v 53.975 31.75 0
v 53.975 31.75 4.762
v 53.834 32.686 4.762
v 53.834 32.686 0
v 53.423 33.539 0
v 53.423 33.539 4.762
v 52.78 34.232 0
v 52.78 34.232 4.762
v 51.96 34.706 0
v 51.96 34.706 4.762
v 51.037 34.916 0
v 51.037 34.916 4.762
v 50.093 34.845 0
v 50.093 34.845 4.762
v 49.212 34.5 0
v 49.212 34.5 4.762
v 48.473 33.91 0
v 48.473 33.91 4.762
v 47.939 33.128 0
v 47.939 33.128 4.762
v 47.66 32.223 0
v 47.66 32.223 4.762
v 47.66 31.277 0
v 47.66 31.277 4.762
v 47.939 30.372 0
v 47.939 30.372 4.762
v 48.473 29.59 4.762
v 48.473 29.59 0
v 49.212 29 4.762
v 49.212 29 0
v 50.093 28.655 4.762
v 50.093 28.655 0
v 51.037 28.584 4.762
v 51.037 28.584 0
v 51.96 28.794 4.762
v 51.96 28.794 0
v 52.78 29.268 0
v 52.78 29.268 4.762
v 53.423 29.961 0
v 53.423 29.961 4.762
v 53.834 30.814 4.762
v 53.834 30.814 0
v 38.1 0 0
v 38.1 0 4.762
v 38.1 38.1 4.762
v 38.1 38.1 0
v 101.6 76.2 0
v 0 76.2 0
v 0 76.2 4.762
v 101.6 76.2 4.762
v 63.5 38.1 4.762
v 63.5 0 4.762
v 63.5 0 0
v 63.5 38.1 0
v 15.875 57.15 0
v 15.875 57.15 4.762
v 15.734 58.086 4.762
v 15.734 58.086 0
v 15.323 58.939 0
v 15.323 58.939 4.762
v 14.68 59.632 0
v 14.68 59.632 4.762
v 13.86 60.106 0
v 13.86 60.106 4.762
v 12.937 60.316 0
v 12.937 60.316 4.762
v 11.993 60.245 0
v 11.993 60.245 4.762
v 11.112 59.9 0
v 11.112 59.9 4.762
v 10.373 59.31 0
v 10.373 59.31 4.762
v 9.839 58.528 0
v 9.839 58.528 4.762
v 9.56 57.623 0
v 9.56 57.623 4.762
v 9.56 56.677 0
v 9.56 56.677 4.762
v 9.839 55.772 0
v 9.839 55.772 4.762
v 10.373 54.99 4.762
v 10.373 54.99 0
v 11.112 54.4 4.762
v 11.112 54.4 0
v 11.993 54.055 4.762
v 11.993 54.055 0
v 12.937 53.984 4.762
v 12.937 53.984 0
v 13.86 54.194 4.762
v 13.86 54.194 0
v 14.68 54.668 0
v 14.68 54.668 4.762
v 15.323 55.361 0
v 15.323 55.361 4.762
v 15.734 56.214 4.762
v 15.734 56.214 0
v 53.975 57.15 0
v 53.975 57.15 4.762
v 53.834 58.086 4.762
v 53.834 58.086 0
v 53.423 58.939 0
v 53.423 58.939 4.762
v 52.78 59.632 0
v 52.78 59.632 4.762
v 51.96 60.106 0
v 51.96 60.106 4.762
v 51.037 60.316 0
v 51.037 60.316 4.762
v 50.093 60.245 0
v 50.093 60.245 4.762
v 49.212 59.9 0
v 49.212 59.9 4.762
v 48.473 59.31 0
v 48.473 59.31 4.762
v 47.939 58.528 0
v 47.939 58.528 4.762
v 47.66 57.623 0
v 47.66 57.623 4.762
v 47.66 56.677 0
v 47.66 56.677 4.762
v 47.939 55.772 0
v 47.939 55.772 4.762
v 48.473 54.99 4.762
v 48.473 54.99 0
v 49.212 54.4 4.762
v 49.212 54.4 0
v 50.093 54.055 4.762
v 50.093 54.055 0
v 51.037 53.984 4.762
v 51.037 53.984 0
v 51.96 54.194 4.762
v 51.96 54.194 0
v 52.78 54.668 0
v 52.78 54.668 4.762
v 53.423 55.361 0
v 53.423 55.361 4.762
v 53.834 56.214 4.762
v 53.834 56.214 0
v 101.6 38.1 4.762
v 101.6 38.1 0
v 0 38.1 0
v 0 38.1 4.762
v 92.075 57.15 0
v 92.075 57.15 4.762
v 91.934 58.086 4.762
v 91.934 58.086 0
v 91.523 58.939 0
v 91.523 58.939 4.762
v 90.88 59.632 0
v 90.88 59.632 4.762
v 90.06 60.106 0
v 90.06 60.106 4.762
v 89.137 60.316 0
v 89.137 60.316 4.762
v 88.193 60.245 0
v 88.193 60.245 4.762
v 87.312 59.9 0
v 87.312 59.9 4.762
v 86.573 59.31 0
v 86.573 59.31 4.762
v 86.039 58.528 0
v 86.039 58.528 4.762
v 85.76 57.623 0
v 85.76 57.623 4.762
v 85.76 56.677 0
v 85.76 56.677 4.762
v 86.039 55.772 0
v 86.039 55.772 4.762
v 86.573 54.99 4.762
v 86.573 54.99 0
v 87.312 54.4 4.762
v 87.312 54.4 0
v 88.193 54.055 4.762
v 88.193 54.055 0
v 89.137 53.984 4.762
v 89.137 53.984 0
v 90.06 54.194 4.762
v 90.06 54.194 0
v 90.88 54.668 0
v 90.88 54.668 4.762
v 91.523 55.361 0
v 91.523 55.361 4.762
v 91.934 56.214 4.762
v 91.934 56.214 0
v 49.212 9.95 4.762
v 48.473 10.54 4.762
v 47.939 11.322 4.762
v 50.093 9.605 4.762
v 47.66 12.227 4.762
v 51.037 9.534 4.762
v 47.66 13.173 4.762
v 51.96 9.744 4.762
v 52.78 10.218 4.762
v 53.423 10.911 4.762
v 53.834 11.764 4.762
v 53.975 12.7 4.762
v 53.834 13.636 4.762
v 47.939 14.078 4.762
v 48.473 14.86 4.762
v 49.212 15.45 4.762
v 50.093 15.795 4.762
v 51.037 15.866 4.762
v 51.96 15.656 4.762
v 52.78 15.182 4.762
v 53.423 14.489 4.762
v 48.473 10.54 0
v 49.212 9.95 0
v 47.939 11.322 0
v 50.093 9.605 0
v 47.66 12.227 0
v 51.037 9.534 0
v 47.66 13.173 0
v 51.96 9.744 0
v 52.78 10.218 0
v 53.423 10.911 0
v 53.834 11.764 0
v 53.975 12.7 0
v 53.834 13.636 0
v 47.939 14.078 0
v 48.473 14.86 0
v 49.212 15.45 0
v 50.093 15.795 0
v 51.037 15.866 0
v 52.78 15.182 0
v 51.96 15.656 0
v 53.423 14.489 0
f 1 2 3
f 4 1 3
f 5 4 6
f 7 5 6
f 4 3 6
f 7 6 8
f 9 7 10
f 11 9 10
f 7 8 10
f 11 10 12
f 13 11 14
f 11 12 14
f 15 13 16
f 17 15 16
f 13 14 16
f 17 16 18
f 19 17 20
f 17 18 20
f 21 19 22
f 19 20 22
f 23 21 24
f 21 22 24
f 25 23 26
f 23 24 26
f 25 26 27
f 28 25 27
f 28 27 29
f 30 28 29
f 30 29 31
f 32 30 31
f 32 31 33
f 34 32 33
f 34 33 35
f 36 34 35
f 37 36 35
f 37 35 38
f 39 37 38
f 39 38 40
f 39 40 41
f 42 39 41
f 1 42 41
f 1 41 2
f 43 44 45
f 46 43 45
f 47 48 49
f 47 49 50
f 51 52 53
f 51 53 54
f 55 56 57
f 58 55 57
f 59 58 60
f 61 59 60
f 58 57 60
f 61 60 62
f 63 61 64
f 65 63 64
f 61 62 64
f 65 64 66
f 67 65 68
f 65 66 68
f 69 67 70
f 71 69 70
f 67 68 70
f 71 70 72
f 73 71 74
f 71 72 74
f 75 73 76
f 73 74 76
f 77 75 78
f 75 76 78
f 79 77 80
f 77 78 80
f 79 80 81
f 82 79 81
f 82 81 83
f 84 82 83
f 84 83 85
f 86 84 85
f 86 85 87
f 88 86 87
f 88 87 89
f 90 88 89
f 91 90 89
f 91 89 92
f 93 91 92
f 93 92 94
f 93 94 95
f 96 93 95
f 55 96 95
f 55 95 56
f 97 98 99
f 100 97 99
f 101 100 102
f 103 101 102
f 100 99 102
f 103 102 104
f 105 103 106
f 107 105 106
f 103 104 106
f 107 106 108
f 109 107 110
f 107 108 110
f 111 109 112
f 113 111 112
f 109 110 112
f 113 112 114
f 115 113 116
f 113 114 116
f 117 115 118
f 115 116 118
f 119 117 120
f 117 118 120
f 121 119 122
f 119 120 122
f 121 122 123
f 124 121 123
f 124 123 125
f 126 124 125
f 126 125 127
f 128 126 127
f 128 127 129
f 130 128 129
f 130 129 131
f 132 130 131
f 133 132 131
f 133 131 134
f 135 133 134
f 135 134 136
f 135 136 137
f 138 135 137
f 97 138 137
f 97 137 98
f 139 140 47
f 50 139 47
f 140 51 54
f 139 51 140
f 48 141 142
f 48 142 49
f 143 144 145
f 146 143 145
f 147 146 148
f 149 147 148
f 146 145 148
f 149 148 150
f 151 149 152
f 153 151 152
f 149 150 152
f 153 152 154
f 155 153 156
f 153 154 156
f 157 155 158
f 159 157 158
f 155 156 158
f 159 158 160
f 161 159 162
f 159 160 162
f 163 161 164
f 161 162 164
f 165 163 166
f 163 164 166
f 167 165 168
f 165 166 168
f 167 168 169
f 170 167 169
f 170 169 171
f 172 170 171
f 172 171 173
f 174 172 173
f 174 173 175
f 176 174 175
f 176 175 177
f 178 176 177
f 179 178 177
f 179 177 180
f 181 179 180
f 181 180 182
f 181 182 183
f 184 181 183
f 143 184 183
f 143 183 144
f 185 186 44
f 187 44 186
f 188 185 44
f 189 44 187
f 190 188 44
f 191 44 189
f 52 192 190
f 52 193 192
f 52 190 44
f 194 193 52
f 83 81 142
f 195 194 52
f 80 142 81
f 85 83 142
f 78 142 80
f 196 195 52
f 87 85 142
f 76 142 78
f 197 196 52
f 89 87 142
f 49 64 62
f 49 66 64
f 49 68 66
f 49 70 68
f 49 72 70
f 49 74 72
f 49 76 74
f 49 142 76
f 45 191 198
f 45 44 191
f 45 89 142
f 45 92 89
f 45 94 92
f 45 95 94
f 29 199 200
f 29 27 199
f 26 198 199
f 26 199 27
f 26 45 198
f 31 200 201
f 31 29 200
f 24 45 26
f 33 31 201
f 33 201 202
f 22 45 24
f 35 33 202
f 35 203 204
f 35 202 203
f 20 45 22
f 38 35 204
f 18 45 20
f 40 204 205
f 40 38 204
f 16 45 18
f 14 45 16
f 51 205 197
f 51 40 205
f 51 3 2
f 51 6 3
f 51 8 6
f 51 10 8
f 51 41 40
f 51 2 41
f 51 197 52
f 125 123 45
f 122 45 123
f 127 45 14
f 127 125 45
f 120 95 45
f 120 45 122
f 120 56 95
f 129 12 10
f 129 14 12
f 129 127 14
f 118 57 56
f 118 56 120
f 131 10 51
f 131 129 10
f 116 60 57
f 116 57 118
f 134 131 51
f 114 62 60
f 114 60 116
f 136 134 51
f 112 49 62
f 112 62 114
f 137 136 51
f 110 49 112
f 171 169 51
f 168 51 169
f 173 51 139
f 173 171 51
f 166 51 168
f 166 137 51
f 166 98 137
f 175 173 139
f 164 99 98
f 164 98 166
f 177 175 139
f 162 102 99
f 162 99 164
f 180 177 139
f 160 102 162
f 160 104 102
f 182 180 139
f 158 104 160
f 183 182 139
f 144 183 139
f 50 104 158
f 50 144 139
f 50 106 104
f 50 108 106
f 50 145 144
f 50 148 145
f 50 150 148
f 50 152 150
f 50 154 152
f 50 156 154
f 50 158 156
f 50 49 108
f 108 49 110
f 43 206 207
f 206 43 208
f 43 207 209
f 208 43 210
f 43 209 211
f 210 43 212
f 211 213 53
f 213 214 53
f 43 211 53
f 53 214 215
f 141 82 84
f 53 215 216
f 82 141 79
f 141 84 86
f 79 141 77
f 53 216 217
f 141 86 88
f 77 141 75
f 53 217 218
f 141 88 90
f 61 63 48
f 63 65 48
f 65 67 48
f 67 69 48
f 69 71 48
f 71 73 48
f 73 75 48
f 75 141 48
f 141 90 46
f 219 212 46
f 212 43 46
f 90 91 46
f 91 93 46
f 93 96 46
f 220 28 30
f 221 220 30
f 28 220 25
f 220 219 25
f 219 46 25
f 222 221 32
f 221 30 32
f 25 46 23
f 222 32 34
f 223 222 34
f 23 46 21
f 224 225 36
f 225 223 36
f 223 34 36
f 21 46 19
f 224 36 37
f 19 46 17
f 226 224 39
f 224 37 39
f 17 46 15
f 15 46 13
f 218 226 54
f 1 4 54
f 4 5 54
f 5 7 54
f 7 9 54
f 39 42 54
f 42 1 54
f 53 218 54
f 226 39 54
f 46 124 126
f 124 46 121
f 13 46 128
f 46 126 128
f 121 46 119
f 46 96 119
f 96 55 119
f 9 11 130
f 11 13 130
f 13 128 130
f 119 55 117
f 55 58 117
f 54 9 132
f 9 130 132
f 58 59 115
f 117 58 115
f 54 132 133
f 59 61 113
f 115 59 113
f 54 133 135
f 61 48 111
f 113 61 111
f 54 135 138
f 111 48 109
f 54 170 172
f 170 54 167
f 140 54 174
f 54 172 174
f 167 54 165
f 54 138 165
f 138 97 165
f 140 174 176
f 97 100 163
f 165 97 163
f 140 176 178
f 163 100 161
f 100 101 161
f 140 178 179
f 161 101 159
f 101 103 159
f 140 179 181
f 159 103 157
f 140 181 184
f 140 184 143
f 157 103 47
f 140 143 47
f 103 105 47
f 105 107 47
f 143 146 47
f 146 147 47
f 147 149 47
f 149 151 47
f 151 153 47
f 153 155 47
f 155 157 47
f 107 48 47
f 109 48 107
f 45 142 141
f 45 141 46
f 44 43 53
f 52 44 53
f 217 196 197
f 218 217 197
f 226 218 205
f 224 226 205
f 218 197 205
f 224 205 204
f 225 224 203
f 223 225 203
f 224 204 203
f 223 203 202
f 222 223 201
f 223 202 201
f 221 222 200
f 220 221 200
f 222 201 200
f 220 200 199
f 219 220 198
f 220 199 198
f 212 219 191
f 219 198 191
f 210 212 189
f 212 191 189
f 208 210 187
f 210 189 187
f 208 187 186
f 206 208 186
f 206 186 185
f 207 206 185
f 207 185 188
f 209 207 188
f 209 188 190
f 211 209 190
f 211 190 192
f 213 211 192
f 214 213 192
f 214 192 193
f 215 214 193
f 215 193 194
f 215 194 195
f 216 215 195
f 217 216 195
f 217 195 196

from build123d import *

# Parameters (mm, degrees)
F0_W     = 101.6
F0_H     = 76.2
F1_DEPTH = 4.7625
F2_W     = 38.1
F2_H     = 38.1
F3_DEPTH = 25.4
F4_R     = 3.175
F5_DEPTH = 25.4


with BuildPart() as f1:
    # F0 (on Top) → F1 (new body)
    with BuildSketch(Plane.XY):
        with Locations((50.8, 38.1)):
            Rectangle(F0_W, F0_H)
    extrude(amount=F1_DEPTH)

    # F2 (on face) → F3 (cut)
    with BuildSketch(Plane.XY.offset(4.7625)):
        with Locations((82.55, 19.05)):
            Rectangle(F2_W, F2_H)
        with Locations((19.05, 19.05)):
            Rectangle(F2_W, F2_H)
    extrude(amount=-F3_DEPTH, mode=Mode.SUBTRACT)

    # F4 (on face) → F5 (cut)
    with BuildSketch(Plane.XY.offset(4.7625)):
        with Locations((50.8, 12.7)):
            Circle(F4_R)
        with Locations((50.8, 31.75)):
            Circle(F4_R)
        with Locations((12.7, 57.15)):
            Circle(F4_R)
        with Locations((50.8, 57.15)):
            Circle(F4_R)
        with Locations((88.9, 57.15)):
            Circle(F4_R)
    extrude(amount=-F5_DEPTH, mode=Mode.SUBTRACT)


solid = f1.part
